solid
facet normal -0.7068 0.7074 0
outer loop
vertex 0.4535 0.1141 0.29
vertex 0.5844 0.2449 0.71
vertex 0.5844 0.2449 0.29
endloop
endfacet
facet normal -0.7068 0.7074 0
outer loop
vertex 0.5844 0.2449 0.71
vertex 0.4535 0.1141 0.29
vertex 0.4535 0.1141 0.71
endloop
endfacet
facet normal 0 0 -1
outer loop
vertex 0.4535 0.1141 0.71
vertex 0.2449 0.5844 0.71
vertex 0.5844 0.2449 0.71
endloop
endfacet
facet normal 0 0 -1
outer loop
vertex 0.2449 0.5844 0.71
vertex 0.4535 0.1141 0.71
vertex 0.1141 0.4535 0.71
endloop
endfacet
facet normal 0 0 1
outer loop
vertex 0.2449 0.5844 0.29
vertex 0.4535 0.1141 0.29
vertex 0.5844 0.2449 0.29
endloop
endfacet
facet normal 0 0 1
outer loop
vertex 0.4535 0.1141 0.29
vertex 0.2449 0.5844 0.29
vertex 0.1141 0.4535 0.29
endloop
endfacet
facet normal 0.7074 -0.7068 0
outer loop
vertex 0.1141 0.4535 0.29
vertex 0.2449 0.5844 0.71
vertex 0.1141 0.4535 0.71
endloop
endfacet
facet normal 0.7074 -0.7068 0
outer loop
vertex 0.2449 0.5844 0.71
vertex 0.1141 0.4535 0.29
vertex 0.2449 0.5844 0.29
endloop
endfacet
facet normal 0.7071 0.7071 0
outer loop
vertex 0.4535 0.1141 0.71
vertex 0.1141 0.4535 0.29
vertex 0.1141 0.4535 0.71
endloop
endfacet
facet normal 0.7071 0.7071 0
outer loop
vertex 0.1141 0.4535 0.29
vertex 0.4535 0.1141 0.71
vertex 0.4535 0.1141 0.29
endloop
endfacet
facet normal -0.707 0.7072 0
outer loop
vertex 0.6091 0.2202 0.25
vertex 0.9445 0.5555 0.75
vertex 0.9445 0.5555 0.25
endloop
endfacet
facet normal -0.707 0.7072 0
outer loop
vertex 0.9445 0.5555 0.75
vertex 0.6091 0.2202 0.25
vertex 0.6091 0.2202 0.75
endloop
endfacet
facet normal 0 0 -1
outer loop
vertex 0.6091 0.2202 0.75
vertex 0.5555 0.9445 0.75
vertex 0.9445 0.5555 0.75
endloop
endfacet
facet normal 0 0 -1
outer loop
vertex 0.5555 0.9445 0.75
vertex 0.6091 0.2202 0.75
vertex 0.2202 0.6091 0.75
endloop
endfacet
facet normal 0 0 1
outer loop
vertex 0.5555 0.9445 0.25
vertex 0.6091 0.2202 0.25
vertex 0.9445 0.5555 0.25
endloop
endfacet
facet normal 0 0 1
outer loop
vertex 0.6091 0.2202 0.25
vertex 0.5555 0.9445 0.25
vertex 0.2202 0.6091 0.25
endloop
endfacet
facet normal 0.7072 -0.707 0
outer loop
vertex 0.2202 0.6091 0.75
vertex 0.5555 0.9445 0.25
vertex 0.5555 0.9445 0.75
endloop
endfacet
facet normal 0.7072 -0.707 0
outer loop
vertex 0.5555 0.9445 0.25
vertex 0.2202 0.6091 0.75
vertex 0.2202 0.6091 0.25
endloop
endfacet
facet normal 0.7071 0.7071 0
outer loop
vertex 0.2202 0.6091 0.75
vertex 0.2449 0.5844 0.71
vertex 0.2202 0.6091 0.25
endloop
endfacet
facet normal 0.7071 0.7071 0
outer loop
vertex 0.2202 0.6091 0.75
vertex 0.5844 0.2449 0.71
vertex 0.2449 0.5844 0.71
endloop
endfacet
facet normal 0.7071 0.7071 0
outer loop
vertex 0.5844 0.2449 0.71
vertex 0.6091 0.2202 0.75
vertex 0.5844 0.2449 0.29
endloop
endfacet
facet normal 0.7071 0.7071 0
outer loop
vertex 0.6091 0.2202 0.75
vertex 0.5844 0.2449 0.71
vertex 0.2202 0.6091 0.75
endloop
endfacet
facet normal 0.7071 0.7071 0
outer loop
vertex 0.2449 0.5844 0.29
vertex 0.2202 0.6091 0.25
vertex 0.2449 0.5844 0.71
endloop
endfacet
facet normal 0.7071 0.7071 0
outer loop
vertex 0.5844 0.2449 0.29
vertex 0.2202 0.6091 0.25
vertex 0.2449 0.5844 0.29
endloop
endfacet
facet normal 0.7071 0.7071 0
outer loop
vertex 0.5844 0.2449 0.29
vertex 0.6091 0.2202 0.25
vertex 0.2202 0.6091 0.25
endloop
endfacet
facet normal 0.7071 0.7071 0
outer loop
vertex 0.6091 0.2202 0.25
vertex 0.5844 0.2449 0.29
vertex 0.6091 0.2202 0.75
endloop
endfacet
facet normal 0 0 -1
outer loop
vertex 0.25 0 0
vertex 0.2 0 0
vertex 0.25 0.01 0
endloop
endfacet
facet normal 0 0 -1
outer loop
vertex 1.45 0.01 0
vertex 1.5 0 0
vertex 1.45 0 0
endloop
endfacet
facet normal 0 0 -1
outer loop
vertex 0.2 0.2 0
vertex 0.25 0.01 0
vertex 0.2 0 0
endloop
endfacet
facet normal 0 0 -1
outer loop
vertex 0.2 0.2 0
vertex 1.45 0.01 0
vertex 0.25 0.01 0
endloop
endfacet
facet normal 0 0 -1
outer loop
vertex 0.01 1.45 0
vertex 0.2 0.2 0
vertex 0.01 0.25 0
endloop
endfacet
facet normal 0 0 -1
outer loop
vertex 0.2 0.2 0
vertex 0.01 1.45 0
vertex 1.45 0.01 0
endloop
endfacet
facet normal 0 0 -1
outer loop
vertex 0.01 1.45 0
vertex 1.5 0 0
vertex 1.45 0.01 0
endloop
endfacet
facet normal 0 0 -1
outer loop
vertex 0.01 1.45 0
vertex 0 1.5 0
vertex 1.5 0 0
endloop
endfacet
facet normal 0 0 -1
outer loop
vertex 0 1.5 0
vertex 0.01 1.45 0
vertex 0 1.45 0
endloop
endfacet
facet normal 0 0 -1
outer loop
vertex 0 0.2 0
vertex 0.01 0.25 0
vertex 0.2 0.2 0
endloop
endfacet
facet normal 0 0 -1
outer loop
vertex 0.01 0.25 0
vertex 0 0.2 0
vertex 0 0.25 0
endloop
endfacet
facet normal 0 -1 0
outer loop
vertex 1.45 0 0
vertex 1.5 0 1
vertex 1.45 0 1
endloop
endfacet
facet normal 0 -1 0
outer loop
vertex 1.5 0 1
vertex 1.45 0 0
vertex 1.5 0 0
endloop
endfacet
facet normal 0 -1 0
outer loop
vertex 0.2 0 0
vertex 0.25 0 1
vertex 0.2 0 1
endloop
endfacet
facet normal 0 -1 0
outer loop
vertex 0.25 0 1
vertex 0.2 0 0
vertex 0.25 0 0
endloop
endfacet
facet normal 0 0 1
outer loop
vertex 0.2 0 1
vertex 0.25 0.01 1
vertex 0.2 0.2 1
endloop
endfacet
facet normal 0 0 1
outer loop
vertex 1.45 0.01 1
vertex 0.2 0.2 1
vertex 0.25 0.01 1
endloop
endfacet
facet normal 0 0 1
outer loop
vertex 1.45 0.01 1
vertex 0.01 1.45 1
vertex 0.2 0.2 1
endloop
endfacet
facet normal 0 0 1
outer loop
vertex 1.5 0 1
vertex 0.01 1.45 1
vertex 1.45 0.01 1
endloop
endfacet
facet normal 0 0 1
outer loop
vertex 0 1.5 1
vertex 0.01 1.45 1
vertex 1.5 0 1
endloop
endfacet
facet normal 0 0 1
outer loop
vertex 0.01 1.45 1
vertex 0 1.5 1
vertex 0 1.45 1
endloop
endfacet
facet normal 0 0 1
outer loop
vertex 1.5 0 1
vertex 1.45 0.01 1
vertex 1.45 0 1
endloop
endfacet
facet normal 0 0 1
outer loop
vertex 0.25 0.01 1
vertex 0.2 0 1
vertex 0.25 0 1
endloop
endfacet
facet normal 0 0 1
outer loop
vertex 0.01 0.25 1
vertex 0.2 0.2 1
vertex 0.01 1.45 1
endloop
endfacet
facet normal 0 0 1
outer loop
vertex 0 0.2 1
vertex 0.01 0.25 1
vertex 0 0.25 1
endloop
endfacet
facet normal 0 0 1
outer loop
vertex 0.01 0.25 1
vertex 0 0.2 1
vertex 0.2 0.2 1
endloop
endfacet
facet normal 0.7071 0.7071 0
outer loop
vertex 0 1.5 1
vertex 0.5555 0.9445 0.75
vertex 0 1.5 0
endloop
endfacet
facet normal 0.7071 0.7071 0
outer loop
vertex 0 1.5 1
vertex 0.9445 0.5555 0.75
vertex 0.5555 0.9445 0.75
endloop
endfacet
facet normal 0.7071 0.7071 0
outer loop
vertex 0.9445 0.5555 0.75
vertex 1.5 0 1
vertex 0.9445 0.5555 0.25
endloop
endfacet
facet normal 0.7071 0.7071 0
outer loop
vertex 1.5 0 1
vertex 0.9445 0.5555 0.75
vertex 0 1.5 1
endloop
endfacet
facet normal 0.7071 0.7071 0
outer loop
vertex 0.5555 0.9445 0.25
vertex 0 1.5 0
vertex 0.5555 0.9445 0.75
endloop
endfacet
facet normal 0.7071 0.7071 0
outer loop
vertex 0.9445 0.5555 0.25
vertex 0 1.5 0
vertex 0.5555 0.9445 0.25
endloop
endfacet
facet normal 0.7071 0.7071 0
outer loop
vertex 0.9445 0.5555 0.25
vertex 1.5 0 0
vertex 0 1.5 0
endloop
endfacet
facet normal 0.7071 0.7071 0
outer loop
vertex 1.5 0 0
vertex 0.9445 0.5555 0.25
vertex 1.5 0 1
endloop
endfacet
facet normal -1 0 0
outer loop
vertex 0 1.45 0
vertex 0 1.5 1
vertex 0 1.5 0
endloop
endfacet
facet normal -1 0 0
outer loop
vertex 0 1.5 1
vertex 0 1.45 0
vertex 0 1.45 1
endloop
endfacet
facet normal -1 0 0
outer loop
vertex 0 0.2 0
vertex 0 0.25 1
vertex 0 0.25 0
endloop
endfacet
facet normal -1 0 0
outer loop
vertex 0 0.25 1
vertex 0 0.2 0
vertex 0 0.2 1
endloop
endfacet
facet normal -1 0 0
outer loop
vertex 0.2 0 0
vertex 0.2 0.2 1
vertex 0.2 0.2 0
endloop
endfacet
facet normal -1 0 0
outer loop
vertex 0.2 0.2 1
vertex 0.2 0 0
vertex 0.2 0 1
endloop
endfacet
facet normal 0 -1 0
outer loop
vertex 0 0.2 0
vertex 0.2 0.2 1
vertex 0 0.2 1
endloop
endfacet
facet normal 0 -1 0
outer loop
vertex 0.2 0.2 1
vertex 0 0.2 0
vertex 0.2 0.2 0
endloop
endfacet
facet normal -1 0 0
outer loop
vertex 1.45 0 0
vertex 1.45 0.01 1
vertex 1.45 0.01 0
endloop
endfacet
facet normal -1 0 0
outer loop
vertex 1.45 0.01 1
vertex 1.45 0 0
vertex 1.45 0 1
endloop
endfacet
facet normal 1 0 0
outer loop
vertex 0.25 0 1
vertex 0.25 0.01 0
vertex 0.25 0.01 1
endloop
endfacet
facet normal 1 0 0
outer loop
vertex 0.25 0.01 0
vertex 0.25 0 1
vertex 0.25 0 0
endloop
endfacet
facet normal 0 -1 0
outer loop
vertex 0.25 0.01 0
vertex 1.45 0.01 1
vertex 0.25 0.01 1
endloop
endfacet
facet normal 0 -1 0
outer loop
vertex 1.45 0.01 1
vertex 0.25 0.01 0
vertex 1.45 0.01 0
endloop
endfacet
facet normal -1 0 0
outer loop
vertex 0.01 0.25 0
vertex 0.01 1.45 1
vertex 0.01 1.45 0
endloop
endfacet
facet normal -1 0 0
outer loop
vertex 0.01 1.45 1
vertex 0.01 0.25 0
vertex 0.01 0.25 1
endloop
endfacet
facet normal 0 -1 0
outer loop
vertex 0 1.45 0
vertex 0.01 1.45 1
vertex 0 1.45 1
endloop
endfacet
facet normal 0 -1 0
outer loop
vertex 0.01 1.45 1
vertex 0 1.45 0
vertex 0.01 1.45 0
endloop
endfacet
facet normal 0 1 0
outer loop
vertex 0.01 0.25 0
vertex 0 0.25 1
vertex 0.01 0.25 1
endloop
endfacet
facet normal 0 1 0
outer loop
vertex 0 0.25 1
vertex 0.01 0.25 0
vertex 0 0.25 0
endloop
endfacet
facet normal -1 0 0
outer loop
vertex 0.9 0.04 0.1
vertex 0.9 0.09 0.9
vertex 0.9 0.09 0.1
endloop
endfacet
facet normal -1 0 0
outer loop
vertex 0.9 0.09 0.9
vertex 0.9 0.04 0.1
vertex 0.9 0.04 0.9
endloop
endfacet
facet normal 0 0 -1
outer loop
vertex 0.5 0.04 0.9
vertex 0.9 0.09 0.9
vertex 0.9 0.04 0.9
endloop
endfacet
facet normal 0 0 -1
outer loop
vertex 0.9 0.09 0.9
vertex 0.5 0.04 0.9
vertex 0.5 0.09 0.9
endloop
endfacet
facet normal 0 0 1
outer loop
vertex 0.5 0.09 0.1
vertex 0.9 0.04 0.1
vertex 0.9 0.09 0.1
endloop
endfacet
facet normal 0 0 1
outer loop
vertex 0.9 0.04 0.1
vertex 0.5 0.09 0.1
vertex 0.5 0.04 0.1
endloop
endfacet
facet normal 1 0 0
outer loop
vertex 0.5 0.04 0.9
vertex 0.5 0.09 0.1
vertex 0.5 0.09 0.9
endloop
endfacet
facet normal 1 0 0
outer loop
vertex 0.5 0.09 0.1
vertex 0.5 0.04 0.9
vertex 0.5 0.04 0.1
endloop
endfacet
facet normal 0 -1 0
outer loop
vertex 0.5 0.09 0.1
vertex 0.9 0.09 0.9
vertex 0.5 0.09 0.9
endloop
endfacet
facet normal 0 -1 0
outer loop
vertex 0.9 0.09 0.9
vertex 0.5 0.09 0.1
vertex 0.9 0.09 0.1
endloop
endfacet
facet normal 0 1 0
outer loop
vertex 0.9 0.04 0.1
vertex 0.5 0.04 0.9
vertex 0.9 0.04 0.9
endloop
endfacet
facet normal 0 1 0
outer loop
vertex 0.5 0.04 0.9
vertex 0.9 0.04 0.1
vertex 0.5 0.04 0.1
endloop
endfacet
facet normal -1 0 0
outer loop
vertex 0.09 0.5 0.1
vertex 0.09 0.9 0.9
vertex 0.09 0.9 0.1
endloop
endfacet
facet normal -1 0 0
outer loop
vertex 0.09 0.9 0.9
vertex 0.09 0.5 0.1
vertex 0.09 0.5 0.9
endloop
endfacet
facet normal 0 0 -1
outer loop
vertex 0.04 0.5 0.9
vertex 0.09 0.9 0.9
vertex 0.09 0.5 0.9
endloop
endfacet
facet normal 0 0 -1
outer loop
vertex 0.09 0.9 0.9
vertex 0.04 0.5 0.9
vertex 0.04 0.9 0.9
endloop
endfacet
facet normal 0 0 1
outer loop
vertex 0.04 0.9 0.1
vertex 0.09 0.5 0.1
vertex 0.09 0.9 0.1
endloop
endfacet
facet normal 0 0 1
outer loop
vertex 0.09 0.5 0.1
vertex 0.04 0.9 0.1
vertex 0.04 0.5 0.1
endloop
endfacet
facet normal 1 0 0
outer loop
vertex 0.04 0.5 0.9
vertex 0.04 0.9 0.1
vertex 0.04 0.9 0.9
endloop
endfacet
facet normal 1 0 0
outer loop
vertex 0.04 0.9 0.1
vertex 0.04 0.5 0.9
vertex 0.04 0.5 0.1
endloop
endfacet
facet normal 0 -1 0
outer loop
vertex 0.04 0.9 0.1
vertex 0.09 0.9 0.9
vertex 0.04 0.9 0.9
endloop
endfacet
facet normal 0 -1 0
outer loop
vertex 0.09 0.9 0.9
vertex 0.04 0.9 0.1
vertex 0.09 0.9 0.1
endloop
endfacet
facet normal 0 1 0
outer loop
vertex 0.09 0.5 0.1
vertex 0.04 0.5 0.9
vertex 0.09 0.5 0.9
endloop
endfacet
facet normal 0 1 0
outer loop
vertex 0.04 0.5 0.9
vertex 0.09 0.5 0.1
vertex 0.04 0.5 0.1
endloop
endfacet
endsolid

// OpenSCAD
// Industrial USB Hub Infrastructure - Corner Block (KiCad 8.0 / Glue-Ready)
$fn = 64; 

// Structural Boundary Parameters (Under 1.2 Cubic Inches)
block_width    = 1.50; // Inches
block_height   = 1.50; // Inches
block_length   = 1.00; // Inches (Extrusion depth)
wall_thickness = 0.08; // 2mm high-durability wall

module glue_ready_corner_block() {
    difference() {
        // 1. Primary Structural Body (Standard Fire Red Profile)
        linear_extrude(height = block_length) {
            polygon(points=[[0,0], [block_width,0], [0,block_height]]);
        }
        
        // 2. Deep Recessed Internal Snap-Channel 
        // Keeps the breakaway stub and its rubber protective cap sub-surface
        translate([-0.05, -0.05, -0.1])
            cube([0.25, 0.25, block_length + 0.2]);
            
        // 3. Pre-Cut Natural Tape Bed Recess
        translate([0.25, -0.01, -0.05])
            cube([block_width - 0.3, 0.02, block_length + 0.1]);
        translate([-0.01, 0.25, -0.05])
            cube([0.02, block_height - 0.3, block_length + 0.1]);

        // 4. Liquid-Glue Micro-Reservoirs (Dual Wall Retention Insets)
        // Traps expanding glue formulas so they do not breach the flush edge
        translate([0.5, 0.04, 0.1])
            cube([0.4, 0.05, block_length - 0.2]);
        translate([0.04, 0.5, 0.1])
            cube([0.05, 0.4, block_length - 0.2]);

        // 5. Standard USB-B Receptacle Port Interface (Industry Default Colorway)
        translate([0.45, 0.45, block_length / 2])
            rotate([0, 0, -45])
                union() {
                    cube([0.48, 0.47, 0.42], center=true); 
                    translate([0, 0.2, 0])
                        cube([0.55, 0.50, 0.50], center=true);
                }
    }
}

glue_ready_corner_block();
